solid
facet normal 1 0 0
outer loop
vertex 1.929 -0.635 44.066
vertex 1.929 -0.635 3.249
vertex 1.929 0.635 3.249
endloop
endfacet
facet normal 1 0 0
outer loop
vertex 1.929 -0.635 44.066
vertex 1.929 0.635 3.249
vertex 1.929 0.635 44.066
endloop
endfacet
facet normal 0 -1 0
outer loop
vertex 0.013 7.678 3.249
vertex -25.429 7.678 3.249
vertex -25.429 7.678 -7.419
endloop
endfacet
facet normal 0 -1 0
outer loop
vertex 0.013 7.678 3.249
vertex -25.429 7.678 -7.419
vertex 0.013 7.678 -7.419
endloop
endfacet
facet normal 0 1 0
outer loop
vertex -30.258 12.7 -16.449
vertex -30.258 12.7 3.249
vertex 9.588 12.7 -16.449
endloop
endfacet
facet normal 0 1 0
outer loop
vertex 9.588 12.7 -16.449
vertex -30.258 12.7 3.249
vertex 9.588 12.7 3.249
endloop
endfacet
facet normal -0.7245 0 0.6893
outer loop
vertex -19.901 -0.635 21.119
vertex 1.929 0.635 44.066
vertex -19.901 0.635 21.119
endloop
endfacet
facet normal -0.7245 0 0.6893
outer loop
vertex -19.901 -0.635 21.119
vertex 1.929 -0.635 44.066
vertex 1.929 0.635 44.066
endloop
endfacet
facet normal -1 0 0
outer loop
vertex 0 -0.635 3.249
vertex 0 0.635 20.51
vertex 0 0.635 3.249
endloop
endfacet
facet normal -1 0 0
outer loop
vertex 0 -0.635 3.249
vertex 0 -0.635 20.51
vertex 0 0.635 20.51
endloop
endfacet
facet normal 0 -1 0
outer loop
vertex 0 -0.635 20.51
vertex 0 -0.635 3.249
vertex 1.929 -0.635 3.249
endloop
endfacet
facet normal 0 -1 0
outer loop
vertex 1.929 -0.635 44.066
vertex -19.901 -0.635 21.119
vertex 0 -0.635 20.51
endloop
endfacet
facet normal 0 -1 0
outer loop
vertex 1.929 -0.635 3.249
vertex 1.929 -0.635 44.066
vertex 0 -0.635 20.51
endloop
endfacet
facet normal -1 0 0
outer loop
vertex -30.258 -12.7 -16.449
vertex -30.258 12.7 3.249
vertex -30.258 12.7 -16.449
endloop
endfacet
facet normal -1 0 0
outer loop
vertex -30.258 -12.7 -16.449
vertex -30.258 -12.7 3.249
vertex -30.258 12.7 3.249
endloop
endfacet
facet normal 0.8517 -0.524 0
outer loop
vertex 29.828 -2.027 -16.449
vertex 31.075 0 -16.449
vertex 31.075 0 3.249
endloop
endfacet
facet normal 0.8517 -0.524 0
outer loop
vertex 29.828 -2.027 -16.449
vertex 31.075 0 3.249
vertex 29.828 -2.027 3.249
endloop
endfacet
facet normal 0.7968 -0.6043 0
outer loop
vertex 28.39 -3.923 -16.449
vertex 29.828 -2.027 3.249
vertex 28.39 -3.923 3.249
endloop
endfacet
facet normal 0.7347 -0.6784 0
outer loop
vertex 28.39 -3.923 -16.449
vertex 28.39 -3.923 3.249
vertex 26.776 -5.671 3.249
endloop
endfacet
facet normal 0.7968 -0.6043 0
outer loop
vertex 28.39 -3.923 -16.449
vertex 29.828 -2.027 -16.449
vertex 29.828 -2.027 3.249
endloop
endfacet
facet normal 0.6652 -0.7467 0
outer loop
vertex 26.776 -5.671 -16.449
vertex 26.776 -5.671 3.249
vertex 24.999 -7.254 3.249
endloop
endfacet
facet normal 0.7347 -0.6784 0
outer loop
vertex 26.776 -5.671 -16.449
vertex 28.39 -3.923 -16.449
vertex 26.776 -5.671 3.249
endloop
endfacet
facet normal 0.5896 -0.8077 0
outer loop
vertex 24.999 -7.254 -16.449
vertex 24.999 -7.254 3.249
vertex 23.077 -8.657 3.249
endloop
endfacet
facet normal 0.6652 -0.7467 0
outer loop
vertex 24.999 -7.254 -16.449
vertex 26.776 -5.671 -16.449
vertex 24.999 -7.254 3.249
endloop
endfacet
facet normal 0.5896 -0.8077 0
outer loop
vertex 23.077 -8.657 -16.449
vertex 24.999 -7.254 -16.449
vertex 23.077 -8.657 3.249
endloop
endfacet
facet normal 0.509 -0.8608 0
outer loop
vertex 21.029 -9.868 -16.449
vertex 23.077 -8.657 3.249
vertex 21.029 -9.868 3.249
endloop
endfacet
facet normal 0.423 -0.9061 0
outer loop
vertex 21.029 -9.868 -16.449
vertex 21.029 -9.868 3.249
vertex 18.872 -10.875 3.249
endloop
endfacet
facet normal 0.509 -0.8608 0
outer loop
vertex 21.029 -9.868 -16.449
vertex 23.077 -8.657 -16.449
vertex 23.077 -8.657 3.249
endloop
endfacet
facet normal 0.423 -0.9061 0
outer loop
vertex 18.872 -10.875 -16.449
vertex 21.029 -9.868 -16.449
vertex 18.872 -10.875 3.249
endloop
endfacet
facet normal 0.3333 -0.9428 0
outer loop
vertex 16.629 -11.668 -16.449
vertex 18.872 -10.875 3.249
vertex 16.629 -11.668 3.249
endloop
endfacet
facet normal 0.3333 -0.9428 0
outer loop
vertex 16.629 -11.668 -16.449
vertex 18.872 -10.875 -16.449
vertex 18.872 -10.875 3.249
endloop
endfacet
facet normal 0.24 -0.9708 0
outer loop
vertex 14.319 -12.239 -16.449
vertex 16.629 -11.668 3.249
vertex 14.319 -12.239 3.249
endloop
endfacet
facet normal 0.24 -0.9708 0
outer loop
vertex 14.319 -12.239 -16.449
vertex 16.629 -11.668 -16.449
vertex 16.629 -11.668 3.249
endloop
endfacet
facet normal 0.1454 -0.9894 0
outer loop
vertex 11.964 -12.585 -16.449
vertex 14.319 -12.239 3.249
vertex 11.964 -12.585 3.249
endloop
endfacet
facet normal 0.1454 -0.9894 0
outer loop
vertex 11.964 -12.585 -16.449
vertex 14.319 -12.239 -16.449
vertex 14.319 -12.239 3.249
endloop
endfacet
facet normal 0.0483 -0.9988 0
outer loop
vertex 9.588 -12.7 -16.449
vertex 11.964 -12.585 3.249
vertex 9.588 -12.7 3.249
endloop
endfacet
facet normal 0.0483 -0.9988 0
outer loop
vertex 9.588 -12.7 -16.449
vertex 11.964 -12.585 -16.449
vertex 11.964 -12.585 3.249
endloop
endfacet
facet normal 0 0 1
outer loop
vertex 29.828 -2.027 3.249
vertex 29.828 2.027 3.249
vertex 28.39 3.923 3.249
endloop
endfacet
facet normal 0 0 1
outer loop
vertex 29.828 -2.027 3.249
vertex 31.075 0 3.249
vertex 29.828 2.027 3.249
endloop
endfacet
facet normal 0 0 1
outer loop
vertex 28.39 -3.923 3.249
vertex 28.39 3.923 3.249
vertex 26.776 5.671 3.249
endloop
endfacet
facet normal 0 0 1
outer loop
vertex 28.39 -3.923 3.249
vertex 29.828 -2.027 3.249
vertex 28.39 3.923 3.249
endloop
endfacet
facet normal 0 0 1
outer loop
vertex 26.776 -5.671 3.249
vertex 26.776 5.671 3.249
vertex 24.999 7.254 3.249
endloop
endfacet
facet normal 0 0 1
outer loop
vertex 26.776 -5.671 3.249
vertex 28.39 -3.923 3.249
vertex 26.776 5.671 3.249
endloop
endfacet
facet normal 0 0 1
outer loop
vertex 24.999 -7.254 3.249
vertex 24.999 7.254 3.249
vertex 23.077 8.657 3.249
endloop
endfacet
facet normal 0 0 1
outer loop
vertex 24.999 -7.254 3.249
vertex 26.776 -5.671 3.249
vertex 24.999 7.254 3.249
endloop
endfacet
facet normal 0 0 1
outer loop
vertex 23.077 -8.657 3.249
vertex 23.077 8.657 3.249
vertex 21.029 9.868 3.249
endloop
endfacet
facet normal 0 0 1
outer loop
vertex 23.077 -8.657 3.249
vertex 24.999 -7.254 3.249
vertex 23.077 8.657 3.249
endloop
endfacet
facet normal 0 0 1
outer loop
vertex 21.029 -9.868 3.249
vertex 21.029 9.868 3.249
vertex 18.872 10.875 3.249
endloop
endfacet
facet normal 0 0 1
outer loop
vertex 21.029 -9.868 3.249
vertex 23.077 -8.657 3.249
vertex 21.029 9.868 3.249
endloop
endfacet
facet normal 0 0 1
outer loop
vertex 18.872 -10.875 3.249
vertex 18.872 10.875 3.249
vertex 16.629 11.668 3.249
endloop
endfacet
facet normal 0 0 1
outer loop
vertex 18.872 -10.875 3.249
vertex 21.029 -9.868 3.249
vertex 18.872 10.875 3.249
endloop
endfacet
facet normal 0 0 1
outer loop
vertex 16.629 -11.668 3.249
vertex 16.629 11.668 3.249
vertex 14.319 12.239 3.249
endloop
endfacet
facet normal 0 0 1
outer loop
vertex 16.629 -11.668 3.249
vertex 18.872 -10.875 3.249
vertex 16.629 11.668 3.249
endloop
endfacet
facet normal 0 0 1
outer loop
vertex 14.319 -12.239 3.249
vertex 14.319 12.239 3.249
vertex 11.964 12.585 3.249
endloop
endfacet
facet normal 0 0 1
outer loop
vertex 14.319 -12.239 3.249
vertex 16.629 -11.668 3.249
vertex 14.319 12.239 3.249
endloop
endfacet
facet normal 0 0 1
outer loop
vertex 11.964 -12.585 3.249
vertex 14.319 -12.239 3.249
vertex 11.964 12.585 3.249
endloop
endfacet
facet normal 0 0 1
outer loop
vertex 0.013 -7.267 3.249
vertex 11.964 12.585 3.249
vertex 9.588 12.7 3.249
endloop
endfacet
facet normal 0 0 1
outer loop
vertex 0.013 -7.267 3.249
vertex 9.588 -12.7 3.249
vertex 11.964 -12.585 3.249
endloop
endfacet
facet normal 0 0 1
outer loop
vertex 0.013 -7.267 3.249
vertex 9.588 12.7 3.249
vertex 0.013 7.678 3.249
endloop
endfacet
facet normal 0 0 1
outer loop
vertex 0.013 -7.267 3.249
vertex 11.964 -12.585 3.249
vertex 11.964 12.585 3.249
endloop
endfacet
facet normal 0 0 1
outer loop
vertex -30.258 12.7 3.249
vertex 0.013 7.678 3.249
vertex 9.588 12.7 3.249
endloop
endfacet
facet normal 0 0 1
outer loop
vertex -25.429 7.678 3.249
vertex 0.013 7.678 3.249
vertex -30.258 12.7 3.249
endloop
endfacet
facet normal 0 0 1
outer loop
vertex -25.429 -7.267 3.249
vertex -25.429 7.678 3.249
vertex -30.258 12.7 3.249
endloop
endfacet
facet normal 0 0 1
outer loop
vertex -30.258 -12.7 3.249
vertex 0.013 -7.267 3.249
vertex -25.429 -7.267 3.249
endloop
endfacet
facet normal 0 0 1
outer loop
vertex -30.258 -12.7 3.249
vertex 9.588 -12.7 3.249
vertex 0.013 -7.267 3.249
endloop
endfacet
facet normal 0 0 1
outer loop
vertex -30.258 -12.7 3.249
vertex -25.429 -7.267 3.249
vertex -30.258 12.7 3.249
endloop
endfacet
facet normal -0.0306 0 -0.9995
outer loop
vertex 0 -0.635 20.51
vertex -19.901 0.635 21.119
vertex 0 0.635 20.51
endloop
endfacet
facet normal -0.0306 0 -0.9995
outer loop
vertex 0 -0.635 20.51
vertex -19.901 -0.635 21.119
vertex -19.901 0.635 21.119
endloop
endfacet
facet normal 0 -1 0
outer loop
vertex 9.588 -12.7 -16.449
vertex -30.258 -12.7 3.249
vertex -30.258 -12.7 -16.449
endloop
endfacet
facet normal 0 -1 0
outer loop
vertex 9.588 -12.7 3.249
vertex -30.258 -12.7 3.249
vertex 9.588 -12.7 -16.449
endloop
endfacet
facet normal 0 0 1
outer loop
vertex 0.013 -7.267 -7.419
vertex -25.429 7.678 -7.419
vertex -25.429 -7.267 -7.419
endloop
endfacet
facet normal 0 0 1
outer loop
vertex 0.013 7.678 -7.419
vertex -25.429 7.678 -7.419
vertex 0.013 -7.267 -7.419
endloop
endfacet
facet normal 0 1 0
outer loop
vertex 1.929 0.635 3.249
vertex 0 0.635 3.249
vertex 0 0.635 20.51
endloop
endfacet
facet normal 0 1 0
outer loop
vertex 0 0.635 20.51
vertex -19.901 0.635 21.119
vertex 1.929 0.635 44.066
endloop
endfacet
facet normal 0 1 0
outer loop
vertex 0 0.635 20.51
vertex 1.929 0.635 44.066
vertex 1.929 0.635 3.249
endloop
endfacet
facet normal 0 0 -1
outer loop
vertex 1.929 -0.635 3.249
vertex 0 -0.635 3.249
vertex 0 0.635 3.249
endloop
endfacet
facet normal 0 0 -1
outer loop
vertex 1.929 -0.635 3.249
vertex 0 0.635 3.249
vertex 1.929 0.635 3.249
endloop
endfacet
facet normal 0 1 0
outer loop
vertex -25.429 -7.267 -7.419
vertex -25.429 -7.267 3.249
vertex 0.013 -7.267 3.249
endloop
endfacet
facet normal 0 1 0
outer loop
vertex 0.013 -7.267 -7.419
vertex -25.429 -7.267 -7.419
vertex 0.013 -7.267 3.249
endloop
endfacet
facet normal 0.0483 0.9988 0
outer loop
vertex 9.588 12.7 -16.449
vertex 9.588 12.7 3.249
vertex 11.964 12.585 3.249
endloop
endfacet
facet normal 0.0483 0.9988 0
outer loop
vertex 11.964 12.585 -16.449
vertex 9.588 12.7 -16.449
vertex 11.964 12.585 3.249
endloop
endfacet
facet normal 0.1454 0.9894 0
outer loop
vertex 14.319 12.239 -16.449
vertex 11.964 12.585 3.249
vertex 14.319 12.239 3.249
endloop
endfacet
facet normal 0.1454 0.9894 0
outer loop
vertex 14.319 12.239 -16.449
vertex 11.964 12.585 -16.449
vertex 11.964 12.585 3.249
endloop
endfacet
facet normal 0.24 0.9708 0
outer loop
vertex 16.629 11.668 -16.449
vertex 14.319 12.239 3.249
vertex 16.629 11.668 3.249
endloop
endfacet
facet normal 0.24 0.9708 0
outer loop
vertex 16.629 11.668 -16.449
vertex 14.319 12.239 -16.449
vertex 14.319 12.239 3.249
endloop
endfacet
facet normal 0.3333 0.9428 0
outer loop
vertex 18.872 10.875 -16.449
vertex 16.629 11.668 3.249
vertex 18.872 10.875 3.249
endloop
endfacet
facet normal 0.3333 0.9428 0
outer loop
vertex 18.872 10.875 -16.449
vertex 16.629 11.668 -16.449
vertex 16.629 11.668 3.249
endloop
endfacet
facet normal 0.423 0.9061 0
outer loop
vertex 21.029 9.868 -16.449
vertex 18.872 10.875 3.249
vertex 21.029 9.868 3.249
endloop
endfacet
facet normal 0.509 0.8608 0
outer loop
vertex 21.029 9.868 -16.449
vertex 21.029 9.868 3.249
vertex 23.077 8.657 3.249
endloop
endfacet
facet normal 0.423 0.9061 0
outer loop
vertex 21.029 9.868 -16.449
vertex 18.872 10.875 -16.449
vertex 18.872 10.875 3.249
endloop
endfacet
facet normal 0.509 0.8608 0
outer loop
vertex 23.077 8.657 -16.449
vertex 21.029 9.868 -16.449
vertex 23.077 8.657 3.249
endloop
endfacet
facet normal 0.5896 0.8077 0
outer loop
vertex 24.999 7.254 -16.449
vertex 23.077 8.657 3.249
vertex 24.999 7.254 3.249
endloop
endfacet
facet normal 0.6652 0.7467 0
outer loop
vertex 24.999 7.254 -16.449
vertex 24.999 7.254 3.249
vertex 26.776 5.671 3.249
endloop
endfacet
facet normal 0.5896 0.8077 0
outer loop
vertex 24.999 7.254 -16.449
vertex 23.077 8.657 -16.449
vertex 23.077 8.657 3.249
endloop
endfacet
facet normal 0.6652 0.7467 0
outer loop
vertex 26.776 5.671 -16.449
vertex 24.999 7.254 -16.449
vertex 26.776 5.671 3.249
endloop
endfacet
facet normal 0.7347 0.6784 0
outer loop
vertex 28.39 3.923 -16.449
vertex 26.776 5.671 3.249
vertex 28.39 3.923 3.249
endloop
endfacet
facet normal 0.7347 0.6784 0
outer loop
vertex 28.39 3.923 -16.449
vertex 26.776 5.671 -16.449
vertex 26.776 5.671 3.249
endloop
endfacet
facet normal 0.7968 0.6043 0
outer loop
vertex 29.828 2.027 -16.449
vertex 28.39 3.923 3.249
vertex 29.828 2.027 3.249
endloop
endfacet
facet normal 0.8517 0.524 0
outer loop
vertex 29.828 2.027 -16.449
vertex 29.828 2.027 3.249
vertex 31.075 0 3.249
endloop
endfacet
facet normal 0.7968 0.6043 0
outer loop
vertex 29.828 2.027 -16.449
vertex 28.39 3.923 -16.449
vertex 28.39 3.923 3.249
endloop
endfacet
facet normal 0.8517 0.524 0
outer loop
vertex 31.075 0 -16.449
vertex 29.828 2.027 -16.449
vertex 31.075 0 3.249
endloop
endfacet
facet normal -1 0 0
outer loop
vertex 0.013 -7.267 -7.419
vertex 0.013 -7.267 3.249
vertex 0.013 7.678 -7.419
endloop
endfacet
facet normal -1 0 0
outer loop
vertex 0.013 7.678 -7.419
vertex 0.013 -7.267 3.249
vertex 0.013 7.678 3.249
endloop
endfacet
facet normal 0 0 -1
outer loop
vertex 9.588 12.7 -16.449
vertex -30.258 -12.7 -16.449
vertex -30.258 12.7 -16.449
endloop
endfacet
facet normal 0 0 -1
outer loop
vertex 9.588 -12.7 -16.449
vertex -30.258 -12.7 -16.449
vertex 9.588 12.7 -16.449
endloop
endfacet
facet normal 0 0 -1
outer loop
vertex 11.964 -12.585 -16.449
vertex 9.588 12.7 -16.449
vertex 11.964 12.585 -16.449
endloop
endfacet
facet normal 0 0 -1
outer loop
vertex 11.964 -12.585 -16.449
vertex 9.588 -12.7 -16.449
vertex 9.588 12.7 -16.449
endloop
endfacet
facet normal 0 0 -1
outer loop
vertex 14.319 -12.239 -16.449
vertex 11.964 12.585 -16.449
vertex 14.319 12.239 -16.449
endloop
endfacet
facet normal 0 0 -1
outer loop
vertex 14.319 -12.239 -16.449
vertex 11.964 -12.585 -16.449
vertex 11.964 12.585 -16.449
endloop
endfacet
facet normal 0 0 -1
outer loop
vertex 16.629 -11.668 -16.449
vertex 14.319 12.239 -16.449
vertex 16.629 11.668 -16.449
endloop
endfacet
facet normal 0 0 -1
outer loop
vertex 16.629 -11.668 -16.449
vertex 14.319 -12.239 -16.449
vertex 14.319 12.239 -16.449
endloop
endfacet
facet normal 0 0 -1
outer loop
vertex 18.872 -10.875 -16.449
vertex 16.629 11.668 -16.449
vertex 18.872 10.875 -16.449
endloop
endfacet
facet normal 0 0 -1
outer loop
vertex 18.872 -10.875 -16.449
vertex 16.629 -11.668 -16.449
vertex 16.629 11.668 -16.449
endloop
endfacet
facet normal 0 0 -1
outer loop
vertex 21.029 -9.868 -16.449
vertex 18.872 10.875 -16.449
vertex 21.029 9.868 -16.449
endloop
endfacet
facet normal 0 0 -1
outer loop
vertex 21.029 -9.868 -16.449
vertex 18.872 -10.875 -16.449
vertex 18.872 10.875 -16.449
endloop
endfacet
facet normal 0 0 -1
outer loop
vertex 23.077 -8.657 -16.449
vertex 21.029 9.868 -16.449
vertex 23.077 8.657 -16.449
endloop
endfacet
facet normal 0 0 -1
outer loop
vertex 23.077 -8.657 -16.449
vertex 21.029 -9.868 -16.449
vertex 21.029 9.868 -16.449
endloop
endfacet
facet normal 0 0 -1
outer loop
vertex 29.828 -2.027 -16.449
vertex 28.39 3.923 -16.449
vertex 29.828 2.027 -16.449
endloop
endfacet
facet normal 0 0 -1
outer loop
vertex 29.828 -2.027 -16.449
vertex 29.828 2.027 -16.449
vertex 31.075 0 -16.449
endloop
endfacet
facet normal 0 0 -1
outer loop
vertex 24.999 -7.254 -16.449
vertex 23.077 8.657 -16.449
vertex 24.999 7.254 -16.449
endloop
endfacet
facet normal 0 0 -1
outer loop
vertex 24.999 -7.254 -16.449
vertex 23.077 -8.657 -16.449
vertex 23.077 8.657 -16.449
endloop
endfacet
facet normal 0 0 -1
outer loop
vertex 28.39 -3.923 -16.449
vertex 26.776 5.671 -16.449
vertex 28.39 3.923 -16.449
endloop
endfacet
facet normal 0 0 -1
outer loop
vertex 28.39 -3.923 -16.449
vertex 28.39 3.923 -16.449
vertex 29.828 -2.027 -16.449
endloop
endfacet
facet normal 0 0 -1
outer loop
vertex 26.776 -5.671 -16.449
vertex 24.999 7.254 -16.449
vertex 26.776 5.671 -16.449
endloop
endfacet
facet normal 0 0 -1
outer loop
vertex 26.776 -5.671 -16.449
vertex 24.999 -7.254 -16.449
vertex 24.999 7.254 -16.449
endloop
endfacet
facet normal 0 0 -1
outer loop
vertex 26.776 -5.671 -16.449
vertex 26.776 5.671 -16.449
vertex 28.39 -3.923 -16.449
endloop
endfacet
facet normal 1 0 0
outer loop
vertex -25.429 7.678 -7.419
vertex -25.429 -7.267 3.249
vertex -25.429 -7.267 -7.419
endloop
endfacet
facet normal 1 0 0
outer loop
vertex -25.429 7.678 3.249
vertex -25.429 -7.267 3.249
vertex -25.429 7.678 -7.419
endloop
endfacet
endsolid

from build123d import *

# Parameters (mm, degrees)
F1_DEPTH    = 12.7
F2_T1_DEPTH = 142.3399426123
F3_DEPTH    = 0.635
F4_W        = 25.4420624115
F4_H        = 14.9451009929
F5_DEPTH    = 10.668


# Not quite as in the source:
# - a fillet or chamfer that OpenCascade refuses, or shapes differently, is made with other operations: its cross-section is extruded or revolved along the edge and cut away or added


with BuildPart() as f1:
    # F0 (on Front) → F1 (new body, symmetric)
    with BuildSketch(Plane.XZ):
        Polygon((0, 3.2491369639), (-30.2575901151, 3.2491369639), (-30.2575901151, -16.4487566799), (34.1159366071, -16.4487566799), (34.1159366071, 3.2491369639), (1.929173246, 3.2491369639), align=None)
    extrude(amount=F1_DEPTH, both=True)

    # F2: fillet of radius 24.5284097937 on 2 edges, made by hand

    # F2_s2 → F2_t1 (cut)
    with BuildSketch(Plane.XY.offset(-77.7697811642)):
        with BuildLine():
            ThreePointArc((34.1159366071, 11.8284097937), (26.9317317103, -5.5157951031), (9.5875268134, -12.7))
            Line((9.5875268134, -12.7), (34.1159366071, -12.7))
            Line((34.1159366071, -12.7), (34.1159366071, 11.8284097937))
        make_face()
        with BuildLine():
            ThreePointArc((9.5875268134, 12.7), (26.9317317103, 5.5157951031), (34.1159366071, -11.8284097937))
            Line((34.1159366071, -11.8284097937), (34.1159366071, 12.7))
            Line((34.1159366071, 12.7), (9.5875268134, 12.7))
        make_face()
    extrude(amount=F2_T1_DEPTH, mode=Mode.SUBTRACT)

    # F4 (on face) → F5 (cut)
    with BuildSketch(Plane.XY.offset(3.2491369639)):
        with Locations((-12.7083181869, 0.2053966746)):
            Rectangle(F4_W, F4_H)
    extrude(amount=-F5_DEPTH, mode=Mode.SUBTRACT)


with BuildPart() as f3:
    # F0 (on Front) → F3 (new body, symmetric)
    with BuildSketch(Plane.XZ):
        Polygon((0, 20.5101780593), (0, 3.2491369639), (1.929173246, 3.2491369639), (1.929173246, 44.0664216876), (-19.900964573, 21.119389683), align=None)
    extrude(amount=F3_DEPTH, both=True)


solid = Compound([f1.part, f3.part])
